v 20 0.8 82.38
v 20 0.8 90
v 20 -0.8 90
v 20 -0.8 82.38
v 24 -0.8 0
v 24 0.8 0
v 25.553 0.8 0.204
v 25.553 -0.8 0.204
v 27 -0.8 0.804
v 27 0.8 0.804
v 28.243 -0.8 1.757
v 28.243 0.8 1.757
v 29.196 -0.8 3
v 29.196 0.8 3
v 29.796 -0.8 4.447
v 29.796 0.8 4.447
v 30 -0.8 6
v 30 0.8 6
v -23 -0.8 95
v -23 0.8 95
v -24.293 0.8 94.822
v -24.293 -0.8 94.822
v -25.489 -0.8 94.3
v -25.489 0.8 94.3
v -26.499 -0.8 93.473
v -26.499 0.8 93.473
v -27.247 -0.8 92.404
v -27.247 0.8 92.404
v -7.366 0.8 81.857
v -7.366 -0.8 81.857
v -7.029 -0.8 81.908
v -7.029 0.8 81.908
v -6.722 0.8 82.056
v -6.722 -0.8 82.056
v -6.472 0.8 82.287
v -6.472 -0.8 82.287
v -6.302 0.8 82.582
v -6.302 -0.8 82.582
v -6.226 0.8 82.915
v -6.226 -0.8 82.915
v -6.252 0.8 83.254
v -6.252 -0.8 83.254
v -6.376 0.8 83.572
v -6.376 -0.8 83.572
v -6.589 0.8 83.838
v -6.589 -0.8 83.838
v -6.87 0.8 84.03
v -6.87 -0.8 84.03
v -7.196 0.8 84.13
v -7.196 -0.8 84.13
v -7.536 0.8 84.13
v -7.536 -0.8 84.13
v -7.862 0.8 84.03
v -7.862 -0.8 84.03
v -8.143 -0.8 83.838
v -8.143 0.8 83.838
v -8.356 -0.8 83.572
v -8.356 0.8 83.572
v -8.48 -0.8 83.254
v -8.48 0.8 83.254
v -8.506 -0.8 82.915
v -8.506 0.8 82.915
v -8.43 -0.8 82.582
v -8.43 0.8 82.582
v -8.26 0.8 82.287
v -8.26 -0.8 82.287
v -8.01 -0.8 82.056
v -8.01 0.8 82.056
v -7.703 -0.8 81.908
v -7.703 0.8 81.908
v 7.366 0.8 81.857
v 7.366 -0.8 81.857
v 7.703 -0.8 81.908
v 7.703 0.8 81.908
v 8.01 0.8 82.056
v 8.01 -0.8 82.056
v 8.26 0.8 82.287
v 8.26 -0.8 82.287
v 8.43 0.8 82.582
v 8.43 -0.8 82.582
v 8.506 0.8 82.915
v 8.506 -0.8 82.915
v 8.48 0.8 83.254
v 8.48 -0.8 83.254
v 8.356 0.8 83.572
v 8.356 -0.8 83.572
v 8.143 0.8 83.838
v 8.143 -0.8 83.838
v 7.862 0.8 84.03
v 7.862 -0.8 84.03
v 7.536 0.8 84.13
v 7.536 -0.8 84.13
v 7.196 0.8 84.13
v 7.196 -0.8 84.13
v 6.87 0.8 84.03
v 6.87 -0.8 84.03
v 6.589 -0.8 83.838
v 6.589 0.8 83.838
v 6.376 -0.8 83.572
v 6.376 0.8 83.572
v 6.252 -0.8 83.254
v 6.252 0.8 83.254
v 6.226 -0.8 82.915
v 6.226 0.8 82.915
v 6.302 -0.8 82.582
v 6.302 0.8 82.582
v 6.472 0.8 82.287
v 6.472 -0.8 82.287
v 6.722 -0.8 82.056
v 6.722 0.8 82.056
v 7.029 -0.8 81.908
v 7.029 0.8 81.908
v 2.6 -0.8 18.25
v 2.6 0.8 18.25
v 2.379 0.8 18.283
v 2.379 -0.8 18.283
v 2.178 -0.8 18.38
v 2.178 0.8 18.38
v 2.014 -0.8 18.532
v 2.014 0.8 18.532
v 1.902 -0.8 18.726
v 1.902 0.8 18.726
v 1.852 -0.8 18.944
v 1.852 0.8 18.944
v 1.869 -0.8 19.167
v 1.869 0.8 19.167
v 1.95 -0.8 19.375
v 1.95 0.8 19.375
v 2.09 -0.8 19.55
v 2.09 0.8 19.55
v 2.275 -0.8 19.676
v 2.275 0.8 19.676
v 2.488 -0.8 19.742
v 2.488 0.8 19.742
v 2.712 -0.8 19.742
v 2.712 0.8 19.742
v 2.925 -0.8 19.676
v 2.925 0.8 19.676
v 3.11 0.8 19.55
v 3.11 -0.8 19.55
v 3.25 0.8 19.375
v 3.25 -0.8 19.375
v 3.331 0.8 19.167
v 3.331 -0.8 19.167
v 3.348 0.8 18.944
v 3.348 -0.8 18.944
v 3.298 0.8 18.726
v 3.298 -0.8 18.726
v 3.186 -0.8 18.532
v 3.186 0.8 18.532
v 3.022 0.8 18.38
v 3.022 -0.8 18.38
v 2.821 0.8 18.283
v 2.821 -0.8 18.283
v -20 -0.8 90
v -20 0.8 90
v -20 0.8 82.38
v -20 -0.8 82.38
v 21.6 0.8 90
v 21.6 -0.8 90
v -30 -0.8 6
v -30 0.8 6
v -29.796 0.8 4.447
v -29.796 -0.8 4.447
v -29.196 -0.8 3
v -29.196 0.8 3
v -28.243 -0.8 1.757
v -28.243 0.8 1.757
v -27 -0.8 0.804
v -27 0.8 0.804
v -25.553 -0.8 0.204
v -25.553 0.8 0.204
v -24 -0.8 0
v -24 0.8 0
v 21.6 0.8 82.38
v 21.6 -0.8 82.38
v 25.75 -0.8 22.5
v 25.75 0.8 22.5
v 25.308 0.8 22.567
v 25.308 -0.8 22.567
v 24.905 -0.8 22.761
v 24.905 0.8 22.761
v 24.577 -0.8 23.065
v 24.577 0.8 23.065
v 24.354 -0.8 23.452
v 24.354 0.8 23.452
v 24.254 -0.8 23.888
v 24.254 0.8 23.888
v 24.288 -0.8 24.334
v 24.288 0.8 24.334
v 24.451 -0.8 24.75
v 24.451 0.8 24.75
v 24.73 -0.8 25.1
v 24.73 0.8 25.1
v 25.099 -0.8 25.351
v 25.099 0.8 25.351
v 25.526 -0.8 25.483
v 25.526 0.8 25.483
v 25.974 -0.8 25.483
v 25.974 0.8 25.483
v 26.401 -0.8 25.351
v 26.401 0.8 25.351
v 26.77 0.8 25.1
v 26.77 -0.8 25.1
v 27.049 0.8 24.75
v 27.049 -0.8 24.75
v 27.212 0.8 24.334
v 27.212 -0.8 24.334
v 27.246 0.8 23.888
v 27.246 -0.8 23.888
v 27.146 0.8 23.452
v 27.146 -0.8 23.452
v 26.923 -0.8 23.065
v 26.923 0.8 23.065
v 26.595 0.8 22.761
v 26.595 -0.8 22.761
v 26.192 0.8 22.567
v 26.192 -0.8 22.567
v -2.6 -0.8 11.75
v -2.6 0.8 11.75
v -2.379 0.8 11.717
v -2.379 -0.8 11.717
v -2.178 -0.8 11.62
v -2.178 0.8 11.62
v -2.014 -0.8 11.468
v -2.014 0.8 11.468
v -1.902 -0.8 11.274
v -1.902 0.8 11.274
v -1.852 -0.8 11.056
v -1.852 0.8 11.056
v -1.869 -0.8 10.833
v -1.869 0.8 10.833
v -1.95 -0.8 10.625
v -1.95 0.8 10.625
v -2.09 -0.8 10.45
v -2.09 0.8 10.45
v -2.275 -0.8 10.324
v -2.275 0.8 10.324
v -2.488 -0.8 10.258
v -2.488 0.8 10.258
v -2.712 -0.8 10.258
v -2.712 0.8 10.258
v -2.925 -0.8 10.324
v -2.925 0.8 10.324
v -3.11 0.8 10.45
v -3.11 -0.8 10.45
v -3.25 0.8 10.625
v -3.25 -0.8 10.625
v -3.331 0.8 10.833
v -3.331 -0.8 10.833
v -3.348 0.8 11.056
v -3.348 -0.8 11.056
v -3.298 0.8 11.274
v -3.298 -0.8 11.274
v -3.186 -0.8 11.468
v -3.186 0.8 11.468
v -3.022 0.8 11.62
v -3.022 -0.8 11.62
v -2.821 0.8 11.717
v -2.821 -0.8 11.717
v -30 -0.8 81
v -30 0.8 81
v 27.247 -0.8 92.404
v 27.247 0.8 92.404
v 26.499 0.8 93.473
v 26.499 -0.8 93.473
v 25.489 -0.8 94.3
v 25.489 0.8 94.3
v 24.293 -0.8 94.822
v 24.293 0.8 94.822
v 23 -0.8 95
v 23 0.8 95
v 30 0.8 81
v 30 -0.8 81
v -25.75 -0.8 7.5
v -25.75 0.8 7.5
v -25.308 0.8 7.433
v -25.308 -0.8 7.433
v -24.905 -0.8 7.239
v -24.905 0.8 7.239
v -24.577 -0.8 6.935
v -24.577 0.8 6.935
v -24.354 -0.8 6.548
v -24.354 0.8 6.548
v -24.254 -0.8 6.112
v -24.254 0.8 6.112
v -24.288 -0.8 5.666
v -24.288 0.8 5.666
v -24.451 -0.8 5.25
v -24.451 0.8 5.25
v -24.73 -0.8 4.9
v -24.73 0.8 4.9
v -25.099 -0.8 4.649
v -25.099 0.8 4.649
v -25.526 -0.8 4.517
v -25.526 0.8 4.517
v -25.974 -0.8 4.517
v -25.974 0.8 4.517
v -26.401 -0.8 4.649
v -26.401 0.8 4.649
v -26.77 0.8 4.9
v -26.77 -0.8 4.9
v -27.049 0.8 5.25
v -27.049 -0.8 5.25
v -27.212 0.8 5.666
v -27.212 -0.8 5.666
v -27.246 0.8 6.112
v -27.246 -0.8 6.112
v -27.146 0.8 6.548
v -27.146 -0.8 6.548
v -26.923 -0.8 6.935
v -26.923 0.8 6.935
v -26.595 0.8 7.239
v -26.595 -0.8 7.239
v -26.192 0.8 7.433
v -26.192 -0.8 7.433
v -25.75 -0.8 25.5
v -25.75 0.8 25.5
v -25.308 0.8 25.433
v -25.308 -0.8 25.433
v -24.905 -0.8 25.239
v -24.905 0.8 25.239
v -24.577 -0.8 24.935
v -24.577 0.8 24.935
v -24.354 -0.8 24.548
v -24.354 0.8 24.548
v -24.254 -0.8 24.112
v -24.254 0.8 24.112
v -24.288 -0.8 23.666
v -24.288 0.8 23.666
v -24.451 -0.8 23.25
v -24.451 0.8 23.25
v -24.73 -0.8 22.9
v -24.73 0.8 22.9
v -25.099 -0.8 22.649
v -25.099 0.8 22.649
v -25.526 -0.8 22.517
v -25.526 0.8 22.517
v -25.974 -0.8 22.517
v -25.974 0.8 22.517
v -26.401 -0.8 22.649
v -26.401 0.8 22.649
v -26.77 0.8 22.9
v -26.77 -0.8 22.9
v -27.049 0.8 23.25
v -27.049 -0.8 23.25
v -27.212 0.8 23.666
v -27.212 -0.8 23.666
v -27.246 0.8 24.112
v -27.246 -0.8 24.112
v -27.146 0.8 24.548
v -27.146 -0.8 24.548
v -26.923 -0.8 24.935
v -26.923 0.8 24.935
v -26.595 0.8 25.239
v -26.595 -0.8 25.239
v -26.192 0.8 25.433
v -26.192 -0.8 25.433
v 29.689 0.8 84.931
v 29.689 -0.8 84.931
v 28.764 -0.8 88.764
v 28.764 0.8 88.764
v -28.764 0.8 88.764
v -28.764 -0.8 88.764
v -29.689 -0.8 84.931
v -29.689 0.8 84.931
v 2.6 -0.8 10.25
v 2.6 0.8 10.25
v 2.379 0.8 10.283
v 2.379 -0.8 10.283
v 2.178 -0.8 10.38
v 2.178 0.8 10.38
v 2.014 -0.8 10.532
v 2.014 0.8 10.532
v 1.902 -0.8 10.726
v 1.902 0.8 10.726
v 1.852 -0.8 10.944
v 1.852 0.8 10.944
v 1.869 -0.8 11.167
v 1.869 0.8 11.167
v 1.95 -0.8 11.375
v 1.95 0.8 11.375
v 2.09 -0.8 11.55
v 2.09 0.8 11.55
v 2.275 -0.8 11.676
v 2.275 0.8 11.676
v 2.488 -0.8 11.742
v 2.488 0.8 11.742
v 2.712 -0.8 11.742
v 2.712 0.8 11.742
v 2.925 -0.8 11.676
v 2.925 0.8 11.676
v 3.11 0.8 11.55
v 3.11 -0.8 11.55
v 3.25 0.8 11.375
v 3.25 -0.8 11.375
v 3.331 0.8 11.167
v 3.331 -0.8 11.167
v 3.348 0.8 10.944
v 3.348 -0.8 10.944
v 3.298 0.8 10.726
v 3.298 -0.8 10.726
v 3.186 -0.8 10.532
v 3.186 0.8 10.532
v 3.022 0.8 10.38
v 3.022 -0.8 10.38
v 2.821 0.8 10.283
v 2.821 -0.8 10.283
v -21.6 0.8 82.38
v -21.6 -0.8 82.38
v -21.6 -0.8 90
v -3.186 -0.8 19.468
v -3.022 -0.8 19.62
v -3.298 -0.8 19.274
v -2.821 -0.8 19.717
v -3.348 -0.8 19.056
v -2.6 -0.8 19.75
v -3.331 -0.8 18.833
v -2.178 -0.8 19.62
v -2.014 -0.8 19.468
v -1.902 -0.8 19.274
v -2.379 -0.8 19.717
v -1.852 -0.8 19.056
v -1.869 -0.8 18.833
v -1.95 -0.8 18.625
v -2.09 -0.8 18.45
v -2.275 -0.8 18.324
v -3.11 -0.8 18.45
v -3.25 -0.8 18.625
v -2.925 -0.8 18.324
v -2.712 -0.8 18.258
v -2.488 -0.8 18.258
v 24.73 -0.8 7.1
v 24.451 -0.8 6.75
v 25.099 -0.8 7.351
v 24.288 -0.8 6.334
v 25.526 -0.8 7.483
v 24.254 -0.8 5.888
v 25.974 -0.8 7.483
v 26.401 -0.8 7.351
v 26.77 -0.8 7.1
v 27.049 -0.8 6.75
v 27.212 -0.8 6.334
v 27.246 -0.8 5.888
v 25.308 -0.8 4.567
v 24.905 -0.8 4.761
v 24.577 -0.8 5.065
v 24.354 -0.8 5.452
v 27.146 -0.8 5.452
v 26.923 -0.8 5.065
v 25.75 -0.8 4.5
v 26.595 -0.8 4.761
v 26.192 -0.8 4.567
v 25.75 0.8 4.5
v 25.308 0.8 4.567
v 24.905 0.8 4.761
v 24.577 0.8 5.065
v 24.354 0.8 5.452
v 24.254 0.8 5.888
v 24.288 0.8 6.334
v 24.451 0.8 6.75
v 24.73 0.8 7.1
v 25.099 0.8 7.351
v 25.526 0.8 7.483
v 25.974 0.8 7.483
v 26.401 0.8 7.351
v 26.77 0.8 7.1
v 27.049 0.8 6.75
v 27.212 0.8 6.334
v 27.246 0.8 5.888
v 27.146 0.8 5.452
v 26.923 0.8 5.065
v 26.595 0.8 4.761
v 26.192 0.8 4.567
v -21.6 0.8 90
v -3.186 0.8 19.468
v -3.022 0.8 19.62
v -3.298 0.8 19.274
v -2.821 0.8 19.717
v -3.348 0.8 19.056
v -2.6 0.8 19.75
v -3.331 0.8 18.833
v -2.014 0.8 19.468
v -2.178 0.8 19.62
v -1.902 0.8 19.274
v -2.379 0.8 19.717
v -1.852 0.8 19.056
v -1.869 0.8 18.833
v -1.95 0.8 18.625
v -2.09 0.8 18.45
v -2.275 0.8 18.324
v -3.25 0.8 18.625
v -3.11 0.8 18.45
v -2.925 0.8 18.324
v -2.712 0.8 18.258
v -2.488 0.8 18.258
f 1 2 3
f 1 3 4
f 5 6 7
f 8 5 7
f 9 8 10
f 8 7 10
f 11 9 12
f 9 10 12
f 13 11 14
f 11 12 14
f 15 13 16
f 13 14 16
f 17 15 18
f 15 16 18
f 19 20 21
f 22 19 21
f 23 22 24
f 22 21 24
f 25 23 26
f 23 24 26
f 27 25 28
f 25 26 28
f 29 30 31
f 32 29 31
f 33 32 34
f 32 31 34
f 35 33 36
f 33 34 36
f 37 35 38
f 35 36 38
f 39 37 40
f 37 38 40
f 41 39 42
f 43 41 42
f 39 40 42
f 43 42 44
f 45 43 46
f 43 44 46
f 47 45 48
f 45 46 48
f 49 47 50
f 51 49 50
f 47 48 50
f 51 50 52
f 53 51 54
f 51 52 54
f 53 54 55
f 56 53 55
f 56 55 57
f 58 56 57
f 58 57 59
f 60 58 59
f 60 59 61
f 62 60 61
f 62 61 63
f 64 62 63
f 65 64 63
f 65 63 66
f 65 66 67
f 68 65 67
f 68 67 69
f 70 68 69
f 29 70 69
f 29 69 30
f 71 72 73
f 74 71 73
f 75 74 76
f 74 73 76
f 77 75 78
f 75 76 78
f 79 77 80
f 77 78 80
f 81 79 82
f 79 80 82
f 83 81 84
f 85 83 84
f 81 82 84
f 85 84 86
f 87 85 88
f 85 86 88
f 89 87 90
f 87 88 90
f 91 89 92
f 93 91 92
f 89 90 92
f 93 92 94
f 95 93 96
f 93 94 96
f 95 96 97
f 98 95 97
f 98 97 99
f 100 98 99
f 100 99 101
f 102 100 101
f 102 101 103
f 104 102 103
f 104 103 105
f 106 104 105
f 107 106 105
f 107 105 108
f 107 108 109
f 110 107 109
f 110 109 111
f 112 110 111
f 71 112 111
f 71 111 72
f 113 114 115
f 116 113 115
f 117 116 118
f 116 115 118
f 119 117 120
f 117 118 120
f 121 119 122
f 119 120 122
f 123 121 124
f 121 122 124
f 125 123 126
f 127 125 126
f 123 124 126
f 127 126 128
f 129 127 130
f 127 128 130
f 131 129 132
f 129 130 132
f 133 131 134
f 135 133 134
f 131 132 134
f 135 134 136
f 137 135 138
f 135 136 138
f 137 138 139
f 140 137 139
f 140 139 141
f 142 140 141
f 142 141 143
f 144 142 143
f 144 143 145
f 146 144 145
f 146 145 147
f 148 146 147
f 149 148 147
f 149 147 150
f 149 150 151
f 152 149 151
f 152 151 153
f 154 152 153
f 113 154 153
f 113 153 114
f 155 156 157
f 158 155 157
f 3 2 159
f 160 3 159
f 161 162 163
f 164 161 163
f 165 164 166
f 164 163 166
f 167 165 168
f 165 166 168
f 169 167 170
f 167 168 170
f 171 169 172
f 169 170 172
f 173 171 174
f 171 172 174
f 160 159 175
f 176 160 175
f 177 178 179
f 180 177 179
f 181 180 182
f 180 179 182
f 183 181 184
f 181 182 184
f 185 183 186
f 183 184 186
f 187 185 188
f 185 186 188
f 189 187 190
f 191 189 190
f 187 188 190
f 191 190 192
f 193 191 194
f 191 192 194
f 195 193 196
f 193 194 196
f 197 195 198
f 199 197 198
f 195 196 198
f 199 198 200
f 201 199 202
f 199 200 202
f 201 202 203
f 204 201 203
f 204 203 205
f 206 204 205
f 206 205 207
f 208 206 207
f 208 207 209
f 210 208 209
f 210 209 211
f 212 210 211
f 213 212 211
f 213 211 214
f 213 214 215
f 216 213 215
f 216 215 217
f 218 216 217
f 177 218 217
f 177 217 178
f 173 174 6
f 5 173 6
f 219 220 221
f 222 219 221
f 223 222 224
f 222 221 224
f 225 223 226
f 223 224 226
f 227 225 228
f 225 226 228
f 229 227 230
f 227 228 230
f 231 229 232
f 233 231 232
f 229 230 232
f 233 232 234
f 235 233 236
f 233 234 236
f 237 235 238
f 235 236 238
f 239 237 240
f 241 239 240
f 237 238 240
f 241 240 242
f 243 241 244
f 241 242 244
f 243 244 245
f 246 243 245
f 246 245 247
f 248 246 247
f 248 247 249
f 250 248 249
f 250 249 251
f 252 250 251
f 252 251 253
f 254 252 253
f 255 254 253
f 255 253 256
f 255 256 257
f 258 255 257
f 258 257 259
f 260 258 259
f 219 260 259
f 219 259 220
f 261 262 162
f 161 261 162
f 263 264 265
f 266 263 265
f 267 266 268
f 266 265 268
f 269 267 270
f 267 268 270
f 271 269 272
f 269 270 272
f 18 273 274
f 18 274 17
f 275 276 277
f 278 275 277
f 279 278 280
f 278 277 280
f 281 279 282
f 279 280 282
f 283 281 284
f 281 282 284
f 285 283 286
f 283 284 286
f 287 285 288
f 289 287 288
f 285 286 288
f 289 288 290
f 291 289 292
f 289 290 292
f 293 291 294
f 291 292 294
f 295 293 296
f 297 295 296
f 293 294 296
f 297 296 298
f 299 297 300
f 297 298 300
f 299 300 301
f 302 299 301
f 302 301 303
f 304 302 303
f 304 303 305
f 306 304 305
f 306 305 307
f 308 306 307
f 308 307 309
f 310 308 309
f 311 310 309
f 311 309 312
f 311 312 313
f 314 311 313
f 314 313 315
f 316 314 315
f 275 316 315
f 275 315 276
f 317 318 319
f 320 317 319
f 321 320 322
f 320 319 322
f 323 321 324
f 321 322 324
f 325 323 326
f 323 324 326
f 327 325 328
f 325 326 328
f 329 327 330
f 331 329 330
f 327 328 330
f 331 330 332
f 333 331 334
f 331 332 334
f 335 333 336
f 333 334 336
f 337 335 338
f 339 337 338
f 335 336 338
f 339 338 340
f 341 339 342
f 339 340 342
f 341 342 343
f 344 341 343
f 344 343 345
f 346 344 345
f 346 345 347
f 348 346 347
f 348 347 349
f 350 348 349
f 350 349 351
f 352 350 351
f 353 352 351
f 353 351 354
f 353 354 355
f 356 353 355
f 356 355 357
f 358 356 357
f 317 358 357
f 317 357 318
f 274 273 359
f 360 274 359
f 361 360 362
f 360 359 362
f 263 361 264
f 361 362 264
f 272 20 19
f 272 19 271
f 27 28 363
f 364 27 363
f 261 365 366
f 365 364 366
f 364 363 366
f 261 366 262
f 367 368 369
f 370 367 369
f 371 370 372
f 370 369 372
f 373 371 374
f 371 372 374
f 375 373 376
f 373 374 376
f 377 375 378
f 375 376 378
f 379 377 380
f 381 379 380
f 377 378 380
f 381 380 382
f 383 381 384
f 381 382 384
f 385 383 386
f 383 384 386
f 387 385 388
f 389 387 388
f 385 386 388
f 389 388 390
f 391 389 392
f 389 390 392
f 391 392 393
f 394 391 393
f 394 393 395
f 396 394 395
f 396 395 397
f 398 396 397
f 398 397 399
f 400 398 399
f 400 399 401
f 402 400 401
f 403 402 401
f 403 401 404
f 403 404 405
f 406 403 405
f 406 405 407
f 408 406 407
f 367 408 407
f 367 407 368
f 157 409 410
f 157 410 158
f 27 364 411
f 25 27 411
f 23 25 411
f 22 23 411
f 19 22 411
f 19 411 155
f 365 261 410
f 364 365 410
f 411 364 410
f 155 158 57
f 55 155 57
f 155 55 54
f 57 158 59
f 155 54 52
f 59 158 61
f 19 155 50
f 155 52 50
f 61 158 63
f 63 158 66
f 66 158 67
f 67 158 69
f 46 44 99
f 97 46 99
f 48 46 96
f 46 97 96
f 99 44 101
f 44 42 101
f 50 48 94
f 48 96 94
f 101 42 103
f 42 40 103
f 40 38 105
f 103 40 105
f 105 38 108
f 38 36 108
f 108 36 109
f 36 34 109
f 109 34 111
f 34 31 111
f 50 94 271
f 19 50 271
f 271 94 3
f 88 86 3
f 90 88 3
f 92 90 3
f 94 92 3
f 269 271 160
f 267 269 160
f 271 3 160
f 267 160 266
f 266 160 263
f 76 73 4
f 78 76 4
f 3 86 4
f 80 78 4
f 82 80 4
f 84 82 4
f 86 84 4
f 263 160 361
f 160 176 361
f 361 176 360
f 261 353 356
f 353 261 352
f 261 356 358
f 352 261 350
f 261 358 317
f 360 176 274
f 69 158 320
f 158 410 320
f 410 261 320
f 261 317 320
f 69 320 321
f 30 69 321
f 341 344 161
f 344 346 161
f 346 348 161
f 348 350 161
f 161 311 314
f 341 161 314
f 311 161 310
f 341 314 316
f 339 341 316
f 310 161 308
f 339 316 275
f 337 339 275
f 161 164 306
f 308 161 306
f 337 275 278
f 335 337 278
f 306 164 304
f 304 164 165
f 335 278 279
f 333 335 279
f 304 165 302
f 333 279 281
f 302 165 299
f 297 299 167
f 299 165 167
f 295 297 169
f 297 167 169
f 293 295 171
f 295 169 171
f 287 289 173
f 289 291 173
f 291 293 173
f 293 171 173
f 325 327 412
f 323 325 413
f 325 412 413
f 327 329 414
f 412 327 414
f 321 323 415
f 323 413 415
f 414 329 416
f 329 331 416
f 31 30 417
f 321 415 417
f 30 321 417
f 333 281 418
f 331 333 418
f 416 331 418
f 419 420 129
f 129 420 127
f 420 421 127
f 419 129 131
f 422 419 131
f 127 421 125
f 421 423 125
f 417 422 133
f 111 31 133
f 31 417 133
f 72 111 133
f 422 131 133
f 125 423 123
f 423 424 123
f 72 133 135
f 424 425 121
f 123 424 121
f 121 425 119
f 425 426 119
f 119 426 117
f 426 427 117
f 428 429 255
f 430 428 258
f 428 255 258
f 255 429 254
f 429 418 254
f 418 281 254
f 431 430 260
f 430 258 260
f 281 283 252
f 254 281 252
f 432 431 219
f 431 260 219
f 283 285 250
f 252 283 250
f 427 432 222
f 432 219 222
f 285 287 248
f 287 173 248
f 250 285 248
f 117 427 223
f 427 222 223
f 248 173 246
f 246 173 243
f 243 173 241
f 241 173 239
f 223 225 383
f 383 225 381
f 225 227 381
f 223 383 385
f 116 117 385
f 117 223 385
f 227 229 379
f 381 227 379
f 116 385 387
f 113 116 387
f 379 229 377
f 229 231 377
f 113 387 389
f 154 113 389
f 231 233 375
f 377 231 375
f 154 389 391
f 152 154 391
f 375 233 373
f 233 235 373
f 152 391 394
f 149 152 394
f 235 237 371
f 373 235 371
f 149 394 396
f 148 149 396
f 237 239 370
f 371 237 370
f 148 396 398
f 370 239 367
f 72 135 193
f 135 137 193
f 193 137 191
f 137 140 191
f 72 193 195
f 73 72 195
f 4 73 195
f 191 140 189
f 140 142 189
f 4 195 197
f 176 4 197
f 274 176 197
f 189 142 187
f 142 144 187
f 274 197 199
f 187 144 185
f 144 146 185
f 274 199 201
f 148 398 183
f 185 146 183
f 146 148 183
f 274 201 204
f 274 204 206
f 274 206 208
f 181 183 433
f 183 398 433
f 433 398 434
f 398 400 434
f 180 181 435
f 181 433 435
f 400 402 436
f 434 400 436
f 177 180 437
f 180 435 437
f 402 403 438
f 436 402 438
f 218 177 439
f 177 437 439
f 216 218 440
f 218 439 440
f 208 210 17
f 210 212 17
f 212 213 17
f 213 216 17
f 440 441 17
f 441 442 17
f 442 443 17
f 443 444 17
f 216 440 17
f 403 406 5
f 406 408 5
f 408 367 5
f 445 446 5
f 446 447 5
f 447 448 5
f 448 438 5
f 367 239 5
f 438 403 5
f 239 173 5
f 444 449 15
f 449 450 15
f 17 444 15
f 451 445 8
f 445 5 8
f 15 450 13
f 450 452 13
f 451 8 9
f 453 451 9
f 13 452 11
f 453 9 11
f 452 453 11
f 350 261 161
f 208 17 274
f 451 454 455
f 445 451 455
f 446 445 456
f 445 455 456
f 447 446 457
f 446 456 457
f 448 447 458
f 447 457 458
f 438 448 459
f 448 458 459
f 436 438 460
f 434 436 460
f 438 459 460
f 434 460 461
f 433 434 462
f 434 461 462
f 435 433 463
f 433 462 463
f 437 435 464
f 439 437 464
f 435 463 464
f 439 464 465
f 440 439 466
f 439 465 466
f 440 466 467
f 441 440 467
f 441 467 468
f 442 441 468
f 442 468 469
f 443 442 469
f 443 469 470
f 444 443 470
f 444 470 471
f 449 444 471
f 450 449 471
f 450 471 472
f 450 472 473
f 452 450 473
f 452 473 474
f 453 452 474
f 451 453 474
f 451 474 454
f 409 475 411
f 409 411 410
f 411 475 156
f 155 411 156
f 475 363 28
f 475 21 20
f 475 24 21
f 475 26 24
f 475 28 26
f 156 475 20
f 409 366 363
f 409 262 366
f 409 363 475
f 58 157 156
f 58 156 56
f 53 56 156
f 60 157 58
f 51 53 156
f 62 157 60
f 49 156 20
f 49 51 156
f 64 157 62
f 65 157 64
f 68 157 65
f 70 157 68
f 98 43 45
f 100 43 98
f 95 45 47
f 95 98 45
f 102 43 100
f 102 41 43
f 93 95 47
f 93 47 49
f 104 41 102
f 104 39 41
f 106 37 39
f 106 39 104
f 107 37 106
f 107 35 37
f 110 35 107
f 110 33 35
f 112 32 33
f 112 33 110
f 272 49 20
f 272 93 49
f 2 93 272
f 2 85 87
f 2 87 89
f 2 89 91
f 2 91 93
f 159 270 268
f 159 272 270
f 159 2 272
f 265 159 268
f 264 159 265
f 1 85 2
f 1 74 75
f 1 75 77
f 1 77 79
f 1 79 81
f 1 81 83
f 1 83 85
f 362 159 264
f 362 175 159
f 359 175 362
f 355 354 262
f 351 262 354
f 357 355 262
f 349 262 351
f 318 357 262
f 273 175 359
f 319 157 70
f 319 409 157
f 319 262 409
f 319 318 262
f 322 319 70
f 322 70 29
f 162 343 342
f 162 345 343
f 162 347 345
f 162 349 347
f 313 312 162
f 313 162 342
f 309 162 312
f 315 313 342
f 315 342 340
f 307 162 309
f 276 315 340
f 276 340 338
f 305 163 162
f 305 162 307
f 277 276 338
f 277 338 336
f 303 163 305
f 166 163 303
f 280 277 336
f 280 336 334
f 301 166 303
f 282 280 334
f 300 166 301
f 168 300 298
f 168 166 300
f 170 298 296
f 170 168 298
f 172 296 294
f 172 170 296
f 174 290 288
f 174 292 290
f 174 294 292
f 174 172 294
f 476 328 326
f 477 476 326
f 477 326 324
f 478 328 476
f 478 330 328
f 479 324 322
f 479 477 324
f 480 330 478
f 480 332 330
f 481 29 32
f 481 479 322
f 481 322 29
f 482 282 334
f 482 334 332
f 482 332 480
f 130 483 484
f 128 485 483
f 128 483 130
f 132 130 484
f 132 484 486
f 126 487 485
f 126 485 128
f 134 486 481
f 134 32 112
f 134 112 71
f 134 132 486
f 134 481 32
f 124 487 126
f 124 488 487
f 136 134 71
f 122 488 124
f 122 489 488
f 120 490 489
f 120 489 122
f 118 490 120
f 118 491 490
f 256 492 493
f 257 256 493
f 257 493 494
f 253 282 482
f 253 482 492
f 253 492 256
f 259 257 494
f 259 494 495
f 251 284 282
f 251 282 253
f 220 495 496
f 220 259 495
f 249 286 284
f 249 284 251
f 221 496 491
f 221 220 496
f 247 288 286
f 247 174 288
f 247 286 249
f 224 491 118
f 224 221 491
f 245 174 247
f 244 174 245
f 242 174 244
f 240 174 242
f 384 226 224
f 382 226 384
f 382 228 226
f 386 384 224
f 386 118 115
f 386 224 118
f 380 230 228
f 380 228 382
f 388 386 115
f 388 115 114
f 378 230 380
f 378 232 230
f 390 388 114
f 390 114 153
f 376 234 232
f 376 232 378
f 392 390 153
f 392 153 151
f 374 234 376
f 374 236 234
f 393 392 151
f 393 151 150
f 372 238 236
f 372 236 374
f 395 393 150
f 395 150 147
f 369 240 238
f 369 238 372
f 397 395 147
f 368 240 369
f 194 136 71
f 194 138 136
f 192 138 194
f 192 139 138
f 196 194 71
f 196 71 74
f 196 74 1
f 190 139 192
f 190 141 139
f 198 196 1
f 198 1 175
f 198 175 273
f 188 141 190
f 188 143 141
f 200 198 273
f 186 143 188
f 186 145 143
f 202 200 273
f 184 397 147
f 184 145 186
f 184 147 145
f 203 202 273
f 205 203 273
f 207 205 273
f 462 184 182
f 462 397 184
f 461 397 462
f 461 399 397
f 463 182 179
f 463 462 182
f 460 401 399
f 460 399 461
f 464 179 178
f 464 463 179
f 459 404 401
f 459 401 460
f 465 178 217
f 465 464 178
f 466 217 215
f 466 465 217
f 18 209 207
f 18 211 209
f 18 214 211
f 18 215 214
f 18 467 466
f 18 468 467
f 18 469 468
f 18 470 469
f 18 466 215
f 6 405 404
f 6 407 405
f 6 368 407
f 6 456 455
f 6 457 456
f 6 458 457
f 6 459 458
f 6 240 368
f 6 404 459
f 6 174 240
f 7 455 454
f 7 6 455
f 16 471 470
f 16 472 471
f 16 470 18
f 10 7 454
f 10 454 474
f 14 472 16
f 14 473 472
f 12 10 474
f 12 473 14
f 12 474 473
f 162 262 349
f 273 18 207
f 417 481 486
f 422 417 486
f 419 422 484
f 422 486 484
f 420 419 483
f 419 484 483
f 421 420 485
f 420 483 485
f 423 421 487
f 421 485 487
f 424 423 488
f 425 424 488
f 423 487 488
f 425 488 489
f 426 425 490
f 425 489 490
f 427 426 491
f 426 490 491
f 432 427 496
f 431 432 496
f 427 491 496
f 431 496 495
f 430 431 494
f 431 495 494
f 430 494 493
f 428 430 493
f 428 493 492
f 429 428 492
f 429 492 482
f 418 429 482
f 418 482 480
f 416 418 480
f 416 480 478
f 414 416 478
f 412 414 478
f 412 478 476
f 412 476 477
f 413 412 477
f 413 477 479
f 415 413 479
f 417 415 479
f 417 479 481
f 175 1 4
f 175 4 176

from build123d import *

# Parameters (mm, degrees)
SKICA1_W                 = 60
SKICA1_H                 = 95
P_IDAT_VYSUNUT_M1_DEPTH  = 0.8
SKICA3_OUTSIDE_W         = 84.474
SKICA3_OUTSIDE_H         = 119.474
ODEBRAT_VYSUNUT_M2_DEPTH = 100.637141669
SKICA2_W                 = 1.6
SKICA2_H                 = 7.62
ODEBRAT_VYSUNUT_M1_DEPTH = 100.637141669
SKICA4_R                 = 1.5
ODEBRAT_VYSUNUT_M3_DEPTH = 100.637141669
SKICA5_R                 = 1.143
ODEBRAT_VYSUNUT_M4_DEPTH = 100.637141669
SKICA8_R                 = 0.75
ODEBRAT_VYSUNUT_M5_DEPTH = 100.637141669


with BuildPart() as part:
    # Skica1 → Přidat vysunutím1 (new, symmetric)
    with BuildSketch(Plane(origin=(0, 0, 0), x_dir=(1, 0, 0), z_dir=(0, 1, 0))):
        with Locations((0, -47.5)):
            Rectangle(SKICA1_W, SKICA1_H)
    extrude(amount=P_IDAT_VYSUNUT_M1_DEPTH, both=True)

    # Skica3 outside → Odebrat vysunutím2 (cut, through all)
    with BuildSketch(Plane(origin=(0, 0.8, 0), x_dir=(1, 0, 0), z_dir=(0, 1, 0))):
        with Locations((0, -47.5)):
            Rectangle(SKICA3_OUTSIDE_W, SKICA3_OUTSIDE_H)
        with BuildLine():
            Line((-24, 0), (24, 0))
            ThreePointArc((24, 0), (28.242640687, -1.757359313), (30, -6))
            Line((30, -6), (30, -81))
            ThreePointArc((30, -81), (29.302055214, -86.866013328), (27.247191011, -92.404494382))
            ThreePointArc((27.247191011, -92.404494382), (25.488738681, -94.299754206), (23, -95))
            Line((23, -95), (-23, -95))
            ThreePointArc((-23, -95), (-25.488738681, -94.299754206), (-27.247191011, -92.404494382))
            ThreePointArc((-27.247191011, -92.404494382), (-29.302055214, -86.866013328), (-30, -81))
            Line((-30, -81), (-30, -6))
            ThreePointArc((-30, -6), (-28.242640687, -1.757359313), (-24, 0))
        make_face(mode=Mode.SUBTRACT)
    extrude(amount=-ODEBRAT_VYSUNUT_M2_DEPTH, mode=Mode.SUBTRACT)

    # Skica2 → Odebrat vysunutím1 (cut, through all)
    with BuildSketch(Plane(origin=(0, 0.8, 0), x_dir=(1, 0, 0), z_dir=(0, 1, 0))):
        with Locations((-20.8, -86.19)):
            Rectangle(SKICA2_W, SKICA2_H)
        with Locations((20.8, -86.19)):
            Rectangle(SKICA2_W, SKICA2_H)
    extrude(amount=-ODEBRAT_VYSUNUT_M1_DEPTH, mode=Mode.SUBTRACT)

    # Skica4 → Odebrat vysunutím3 (cut, through all)
    with BuildSketch(Plane(origin=(0, 0.8, 0), x_dir=(1, 0, 0), z_dir=(0, 1, 0))):
        with Locations(Location((-25.75, -6, 0), (0, 0, 270))):
            Circle(SKICA4_R)
        with Locations(Location((-25.75, -24, 0), (0, 0, 270))):
            Circle(SKICA4_R)
        with Locations(Location((25.75, -24, 0), (0, 0, 90))):
            Circle(SKICA4_R)
        with Locations(Location((25.75, -6, 0), (0, 0, 90))):
            Circle(SKICA4_R)
    extrude(amount=-ODEBRAT_VYSUNUT_M3_DEPTH, mode=Mode.SUBTRACT)

    # Skica5 → Odebrat vysunutím4 (cut, through all)
    with BuildSketch(Plane.XZ.offset(0.8)):
        with Locations(Location((-7.366, 83, 0), (0, 0, 270))):
            Circle(SKICA5_R)
        with Locations(Location((7.366, 83, 0), (0, 0, 270))):
            Circle(SKICA5_R)
    extrude(amount=-ODEBRAT_VYSUNUT_M4_DEPTH, mode=Mode.SUBTRACT)

    # Skica8 → Odebrat vysunutím5 (cut, through all)
    with BuildSketch(Plane(origin=(0, 0.8, 0), x_dir=(1, 0, 0), z_dir=(0, 1, 0))):
        with Locations(Location((-2.6, -11, 0), (0, 0, 270))):
            Circle(SKICA8_R)
        with Locations(Location((-2.6, -19, 0), (0, 0, 270))):
            Circle(SKICA8_R)
        with Locations(Location((2.6, -19, 0), (0, 0, 90))):
            Circle(SKICA8_R)
        with Locations(Location((2.6, -11, 0), (0, 0, 90))):
            Circle(SKICA8_R)
    extrude(amount=-ODEBRAT_VYSUNUT_M5_DEPTH, mode=Mode.SUBTRACT)


solid = part.part
